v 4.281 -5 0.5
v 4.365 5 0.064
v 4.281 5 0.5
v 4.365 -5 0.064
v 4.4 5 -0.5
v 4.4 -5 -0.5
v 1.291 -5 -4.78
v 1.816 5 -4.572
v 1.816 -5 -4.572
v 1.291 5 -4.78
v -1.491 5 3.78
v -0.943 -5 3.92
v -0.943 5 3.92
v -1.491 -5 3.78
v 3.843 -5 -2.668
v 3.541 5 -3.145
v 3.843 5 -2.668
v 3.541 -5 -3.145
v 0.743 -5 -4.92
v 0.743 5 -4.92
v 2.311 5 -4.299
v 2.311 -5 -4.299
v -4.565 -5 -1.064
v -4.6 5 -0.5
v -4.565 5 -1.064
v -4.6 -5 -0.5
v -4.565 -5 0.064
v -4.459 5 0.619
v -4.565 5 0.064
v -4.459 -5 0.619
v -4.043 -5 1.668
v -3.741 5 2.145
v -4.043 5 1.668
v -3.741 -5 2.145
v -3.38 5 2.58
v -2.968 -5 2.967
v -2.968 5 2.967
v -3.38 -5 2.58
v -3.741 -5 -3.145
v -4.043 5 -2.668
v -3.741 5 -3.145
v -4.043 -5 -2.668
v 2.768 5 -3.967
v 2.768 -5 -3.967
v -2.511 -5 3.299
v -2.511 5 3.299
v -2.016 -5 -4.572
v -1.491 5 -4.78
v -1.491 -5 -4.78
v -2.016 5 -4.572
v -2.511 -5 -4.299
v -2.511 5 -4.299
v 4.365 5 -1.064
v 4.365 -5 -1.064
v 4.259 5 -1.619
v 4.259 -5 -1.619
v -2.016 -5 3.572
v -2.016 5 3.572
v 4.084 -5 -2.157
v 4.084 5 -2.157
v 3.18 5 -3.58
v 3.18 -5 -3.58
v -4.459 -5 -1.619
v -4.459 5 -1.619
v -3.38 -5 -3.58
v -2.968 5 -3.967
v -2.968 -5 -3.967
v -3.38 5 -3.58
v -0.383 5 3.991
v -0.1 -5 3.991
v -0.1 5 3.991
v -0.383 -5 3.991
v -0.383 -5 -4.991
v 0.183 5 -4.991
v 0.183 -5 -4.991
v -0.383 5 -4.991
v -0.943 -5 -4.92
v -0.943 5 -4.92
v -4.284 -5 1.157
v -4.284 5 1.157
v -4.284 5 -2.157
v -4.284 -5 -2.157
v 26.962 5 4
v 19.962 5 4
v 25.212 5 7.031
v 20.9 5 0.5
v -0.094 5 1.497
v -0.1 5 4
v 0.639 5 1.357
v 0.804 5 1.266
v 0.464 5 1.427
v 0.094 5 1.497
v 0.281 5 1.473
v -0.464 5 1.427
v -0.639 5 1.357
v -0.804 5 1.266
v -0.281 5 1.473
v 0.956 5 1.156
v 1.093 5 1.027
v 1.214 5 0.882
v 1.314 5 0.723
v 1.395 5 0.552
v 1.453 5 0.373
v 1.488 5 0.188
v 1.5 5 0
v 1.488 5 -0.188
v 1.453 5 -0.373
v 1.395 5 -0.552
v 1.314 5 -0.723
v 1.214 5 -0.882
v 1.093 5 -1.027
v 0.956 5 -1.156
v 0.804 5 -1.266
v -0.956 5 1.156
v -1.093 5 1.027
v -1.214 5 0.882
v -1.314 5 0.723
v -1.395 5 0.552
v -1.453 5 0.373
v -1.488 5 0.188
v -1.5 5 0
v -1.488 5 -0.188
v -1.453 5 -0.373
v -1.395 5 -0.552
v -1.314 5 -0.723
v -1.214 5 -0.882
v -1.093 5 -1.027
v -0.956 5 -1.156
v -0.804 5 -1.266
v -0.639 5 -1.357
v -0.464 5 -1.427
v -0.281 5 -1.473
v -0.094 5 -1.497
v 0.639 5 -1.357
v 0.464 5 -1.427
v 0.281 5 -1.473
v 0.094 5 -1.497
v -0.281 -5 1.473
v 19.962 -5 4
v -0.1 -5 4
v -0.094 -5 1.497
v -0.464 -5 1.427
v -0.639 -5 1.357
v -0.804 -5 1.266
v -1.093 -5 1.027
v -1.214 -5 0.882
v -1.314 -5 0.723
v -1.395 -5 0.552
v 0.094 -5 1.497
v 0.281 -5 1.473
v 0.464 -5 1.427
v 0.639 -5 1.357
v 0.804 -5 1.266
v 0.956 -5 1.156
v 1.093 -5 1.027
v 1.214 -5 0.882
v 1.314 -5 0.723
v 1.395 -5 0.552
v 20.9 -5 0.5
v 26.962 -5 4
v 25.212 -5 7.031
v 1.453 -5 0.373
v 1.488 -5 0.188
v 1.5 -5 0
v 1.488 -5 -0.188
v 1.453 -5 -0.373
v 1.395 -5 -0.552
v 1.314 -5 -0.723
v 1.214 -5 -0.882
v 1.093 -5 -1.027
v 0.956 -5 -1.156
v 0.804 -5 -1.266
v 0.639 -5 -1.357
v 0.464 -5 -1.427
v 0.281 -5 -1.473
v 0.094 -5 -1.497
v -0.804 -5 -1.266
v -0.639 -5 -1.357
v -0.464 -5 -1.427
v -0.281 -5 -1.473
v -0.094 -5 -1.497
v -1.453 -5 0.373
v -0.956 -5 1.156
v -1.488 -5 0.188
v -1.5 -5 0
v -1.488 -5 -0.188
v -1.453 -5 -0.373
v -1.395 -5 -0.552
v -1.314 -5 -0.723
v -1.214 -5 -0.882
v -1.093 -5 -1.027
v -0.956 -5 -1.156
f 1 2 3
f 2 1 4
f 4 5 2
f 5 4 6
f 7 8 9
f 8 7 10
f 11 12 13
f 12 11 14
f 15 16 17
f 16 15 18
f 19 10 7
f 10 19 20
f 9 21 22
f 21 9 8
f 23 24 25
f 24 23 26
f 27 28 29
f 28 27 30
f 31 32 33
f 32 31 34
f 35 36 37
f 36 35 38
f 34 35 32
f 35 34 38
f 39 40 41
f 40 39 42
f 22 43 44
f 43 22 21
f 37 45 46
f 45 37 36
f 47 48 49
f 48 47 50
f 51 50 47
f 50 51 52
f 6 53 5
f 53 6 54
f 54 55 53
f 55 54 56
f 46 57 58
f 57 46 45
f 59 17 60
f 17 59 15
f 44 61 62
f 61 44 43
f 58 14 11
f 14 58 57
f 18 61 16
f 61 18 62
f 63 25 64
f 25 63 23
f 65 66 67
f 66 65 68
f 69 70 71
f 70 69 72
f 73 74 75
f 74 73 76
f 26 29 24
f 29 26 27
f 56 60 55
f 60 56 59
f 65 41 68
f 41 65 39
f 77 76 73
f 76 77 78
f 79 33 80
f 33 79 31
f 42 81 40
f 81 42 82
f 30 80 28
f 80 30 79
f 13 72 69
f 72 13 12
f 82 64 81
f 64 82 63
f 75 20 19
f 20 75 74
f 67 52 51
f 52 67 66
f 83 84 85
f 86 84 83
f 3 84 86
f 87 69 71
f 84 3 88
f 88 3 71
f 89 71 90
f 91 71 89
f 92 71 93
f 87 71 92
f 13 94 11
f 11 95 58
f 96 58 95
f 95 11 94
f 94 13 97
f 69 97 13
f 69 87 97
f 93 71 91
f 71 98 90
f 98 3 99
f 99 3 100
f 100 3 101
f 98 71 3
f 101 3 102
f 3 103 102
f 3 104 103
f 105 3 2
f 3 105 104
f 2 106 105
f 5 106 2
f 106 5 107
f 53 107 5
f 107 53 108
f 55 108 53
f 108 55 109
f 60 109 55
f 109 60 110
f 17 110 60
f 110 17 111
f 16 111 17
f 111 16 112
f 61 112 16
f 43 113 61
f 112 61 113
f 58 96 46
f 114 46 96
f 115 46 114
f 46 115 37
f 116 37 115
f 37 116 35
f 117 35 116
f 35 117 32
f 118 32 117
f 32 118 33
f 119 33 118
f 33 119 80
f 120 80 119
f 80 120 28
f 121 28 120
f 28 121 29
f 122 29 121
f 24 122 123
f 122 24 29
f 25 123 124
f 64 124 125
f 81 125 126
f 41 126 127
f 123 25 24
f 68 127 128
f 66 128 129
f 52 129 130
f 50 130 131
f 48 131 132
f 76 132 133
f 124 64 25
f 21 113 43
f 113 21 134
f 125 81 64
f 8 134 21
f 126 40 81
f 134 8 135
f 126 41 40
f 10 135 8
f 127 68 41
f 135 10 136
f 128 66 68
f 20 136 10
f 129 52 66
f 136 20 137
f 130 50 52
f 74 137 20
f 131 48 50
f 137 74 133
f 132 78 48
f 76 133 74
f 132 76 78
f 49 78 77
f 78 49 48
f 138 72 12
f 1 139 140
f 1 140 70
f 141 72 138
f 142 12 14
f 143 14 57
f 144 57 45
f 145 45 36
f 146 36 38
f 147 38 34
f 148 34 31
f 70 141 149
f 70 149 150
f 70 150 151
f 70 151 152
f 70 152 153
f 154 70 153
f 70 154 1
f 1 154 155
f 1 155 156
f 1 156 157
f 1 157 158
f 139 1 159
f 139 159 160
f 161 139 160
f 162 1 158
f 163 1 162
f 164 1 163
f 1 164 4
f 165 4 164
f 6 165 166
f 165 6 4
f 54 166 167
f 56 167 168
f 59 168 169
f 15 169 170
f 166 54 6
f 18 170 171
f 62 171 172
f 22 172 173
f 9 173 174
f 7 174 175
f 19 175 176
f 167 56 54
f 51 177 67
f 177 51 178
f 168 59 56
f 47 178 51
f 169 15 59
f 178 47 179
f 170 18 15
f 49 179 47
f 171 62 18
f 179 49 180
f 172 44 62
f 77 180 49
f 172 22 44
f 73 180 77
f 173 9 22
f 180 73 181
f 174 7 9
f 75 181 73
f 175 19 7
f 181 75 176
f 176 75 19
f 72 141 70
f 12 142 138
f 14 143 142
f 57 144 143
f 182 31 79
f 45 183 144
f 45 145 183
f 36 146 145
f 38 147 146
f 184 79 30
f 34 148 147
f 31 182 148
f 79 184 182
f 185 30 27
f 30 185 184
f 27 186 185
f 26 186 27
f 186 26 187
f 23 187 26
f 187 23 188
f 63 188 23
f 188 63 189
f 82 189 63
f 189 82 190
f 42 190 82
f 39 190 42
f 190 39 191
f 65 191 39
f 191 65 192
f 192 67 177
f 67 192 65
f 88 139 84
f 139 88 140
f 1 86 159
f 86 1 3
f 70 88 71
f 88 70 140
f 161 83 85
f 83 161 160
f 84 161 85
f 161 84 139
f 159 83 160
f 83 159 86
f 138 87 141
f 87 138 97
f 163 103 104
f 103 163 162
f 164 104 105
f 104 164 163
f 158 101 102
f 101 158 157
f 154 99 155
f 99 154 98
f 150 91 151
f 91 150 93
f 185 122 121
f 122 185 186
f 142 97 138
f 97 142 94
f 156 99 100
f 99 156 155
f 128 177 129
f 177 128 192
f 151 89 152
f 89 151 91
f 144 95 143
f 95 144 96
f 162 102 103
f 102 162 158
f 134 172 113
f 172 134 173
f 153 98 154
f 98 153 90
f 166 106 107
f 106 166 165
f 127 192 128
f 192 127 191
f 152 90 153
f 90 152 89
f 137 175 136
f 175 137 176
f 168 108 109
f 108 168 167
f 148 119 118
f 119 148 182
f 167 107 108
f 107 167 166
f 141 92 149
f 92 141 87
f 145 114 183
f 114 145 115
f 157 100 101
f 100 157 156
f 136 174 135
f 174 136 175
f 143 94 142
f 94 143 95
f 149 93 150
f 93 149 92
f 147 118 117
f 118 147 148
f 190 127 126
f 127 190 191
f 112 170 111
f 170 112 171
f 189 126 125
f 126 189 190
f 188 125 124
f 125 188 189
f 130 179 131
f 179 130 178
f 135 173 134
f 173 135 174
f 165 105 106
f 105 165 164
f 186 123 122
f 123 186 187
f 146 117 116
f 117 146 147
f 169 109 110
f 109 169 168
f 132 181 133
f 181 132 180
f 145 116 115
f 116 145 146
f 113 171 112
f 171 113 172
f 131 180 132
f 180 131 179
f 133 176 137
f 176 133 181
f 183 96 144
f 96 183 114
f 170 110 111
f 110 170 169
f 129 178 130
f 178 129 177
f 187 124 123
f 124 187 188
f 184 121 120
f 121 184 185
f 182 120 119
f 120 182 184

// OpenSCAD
/*
 *  This file is part of the portable pluggable YAGI Design.
 *
 *  This documentation describes Open Hardware and is licensed under the
 *  CERN OHL either version 1.2 of the license, or (at your option) any
 *  later version.
 *
 *  You may redistribute and modify this documentation under the terms of
 *  the CERN OHL v.1.2 (http://ohwr.org/cernohl). This documentation is
 *  distributed WITHOUT ANY EXPRESS OR IMPLIED WARRANTY, INCLUDING OF
 *  MERCHANTABILITY, SATISFACTORY QUALITY AND FITNESS FOR A PARTICULAR PURPOSE.
 *  Please see the CERN OHL v.1.2 for applicable conditions.
 *
 *  Copyright (c) 2016 Thomas Pointhuber
 */

module clamp(clamp_lever_length = 28,
             clamp_lever_height = 3.5,
             clamp_base_lever_length = 21,
             clamp_top_angle = 30,
             clamp_width = 10,
             clamp_asymetic_y=0.5,
             clamp_asymetic_x=0.1,
             clamp_diameter=9,
             clamp_hole=3) {
    $fn = 50;

    difference() {
        union() {
            // main body
            translate([-clamp_asymetic_x, clamp_width/2, -clamp_asymetic_y])
                rotate([90, 0, 0])
                        cylinder(r=clamp_diameter/2, clamp_width);
            
            // main lever
            translate([-clamp_asymetic_x,
                       -clamp_width/2,
                       clamp_diameter/2-clamp_lever_height-clamp_asymetic_y])
                cube([clamp_base_lever_length, clamp_width, clamp_lever_height]);
            
            // top part of lever
            translate([-clamp_asymetic_x+clamp_base_lever_length,
                       -clamp_width/2,
                       clamp_diameter/2-clamp_lever_height-clamp_asymetic_y])
                rotate([0, -clamp_top_angle, 0])
                cube([clamp_lever_length-clamp_base_lever_length, clamp_width, clamp_lever_height]);
        }
        
        // mounting hole
        translate([0, clamp_width/2+1, 0])
            rotate([90, 0, 0])
                    cylinder(r=clamp_hole/2, clamp_width+2);
    }
}

/*translate([18.5, 0, 10/2 + 9/2 + 0.5 - 0.1])*/ clamp();
